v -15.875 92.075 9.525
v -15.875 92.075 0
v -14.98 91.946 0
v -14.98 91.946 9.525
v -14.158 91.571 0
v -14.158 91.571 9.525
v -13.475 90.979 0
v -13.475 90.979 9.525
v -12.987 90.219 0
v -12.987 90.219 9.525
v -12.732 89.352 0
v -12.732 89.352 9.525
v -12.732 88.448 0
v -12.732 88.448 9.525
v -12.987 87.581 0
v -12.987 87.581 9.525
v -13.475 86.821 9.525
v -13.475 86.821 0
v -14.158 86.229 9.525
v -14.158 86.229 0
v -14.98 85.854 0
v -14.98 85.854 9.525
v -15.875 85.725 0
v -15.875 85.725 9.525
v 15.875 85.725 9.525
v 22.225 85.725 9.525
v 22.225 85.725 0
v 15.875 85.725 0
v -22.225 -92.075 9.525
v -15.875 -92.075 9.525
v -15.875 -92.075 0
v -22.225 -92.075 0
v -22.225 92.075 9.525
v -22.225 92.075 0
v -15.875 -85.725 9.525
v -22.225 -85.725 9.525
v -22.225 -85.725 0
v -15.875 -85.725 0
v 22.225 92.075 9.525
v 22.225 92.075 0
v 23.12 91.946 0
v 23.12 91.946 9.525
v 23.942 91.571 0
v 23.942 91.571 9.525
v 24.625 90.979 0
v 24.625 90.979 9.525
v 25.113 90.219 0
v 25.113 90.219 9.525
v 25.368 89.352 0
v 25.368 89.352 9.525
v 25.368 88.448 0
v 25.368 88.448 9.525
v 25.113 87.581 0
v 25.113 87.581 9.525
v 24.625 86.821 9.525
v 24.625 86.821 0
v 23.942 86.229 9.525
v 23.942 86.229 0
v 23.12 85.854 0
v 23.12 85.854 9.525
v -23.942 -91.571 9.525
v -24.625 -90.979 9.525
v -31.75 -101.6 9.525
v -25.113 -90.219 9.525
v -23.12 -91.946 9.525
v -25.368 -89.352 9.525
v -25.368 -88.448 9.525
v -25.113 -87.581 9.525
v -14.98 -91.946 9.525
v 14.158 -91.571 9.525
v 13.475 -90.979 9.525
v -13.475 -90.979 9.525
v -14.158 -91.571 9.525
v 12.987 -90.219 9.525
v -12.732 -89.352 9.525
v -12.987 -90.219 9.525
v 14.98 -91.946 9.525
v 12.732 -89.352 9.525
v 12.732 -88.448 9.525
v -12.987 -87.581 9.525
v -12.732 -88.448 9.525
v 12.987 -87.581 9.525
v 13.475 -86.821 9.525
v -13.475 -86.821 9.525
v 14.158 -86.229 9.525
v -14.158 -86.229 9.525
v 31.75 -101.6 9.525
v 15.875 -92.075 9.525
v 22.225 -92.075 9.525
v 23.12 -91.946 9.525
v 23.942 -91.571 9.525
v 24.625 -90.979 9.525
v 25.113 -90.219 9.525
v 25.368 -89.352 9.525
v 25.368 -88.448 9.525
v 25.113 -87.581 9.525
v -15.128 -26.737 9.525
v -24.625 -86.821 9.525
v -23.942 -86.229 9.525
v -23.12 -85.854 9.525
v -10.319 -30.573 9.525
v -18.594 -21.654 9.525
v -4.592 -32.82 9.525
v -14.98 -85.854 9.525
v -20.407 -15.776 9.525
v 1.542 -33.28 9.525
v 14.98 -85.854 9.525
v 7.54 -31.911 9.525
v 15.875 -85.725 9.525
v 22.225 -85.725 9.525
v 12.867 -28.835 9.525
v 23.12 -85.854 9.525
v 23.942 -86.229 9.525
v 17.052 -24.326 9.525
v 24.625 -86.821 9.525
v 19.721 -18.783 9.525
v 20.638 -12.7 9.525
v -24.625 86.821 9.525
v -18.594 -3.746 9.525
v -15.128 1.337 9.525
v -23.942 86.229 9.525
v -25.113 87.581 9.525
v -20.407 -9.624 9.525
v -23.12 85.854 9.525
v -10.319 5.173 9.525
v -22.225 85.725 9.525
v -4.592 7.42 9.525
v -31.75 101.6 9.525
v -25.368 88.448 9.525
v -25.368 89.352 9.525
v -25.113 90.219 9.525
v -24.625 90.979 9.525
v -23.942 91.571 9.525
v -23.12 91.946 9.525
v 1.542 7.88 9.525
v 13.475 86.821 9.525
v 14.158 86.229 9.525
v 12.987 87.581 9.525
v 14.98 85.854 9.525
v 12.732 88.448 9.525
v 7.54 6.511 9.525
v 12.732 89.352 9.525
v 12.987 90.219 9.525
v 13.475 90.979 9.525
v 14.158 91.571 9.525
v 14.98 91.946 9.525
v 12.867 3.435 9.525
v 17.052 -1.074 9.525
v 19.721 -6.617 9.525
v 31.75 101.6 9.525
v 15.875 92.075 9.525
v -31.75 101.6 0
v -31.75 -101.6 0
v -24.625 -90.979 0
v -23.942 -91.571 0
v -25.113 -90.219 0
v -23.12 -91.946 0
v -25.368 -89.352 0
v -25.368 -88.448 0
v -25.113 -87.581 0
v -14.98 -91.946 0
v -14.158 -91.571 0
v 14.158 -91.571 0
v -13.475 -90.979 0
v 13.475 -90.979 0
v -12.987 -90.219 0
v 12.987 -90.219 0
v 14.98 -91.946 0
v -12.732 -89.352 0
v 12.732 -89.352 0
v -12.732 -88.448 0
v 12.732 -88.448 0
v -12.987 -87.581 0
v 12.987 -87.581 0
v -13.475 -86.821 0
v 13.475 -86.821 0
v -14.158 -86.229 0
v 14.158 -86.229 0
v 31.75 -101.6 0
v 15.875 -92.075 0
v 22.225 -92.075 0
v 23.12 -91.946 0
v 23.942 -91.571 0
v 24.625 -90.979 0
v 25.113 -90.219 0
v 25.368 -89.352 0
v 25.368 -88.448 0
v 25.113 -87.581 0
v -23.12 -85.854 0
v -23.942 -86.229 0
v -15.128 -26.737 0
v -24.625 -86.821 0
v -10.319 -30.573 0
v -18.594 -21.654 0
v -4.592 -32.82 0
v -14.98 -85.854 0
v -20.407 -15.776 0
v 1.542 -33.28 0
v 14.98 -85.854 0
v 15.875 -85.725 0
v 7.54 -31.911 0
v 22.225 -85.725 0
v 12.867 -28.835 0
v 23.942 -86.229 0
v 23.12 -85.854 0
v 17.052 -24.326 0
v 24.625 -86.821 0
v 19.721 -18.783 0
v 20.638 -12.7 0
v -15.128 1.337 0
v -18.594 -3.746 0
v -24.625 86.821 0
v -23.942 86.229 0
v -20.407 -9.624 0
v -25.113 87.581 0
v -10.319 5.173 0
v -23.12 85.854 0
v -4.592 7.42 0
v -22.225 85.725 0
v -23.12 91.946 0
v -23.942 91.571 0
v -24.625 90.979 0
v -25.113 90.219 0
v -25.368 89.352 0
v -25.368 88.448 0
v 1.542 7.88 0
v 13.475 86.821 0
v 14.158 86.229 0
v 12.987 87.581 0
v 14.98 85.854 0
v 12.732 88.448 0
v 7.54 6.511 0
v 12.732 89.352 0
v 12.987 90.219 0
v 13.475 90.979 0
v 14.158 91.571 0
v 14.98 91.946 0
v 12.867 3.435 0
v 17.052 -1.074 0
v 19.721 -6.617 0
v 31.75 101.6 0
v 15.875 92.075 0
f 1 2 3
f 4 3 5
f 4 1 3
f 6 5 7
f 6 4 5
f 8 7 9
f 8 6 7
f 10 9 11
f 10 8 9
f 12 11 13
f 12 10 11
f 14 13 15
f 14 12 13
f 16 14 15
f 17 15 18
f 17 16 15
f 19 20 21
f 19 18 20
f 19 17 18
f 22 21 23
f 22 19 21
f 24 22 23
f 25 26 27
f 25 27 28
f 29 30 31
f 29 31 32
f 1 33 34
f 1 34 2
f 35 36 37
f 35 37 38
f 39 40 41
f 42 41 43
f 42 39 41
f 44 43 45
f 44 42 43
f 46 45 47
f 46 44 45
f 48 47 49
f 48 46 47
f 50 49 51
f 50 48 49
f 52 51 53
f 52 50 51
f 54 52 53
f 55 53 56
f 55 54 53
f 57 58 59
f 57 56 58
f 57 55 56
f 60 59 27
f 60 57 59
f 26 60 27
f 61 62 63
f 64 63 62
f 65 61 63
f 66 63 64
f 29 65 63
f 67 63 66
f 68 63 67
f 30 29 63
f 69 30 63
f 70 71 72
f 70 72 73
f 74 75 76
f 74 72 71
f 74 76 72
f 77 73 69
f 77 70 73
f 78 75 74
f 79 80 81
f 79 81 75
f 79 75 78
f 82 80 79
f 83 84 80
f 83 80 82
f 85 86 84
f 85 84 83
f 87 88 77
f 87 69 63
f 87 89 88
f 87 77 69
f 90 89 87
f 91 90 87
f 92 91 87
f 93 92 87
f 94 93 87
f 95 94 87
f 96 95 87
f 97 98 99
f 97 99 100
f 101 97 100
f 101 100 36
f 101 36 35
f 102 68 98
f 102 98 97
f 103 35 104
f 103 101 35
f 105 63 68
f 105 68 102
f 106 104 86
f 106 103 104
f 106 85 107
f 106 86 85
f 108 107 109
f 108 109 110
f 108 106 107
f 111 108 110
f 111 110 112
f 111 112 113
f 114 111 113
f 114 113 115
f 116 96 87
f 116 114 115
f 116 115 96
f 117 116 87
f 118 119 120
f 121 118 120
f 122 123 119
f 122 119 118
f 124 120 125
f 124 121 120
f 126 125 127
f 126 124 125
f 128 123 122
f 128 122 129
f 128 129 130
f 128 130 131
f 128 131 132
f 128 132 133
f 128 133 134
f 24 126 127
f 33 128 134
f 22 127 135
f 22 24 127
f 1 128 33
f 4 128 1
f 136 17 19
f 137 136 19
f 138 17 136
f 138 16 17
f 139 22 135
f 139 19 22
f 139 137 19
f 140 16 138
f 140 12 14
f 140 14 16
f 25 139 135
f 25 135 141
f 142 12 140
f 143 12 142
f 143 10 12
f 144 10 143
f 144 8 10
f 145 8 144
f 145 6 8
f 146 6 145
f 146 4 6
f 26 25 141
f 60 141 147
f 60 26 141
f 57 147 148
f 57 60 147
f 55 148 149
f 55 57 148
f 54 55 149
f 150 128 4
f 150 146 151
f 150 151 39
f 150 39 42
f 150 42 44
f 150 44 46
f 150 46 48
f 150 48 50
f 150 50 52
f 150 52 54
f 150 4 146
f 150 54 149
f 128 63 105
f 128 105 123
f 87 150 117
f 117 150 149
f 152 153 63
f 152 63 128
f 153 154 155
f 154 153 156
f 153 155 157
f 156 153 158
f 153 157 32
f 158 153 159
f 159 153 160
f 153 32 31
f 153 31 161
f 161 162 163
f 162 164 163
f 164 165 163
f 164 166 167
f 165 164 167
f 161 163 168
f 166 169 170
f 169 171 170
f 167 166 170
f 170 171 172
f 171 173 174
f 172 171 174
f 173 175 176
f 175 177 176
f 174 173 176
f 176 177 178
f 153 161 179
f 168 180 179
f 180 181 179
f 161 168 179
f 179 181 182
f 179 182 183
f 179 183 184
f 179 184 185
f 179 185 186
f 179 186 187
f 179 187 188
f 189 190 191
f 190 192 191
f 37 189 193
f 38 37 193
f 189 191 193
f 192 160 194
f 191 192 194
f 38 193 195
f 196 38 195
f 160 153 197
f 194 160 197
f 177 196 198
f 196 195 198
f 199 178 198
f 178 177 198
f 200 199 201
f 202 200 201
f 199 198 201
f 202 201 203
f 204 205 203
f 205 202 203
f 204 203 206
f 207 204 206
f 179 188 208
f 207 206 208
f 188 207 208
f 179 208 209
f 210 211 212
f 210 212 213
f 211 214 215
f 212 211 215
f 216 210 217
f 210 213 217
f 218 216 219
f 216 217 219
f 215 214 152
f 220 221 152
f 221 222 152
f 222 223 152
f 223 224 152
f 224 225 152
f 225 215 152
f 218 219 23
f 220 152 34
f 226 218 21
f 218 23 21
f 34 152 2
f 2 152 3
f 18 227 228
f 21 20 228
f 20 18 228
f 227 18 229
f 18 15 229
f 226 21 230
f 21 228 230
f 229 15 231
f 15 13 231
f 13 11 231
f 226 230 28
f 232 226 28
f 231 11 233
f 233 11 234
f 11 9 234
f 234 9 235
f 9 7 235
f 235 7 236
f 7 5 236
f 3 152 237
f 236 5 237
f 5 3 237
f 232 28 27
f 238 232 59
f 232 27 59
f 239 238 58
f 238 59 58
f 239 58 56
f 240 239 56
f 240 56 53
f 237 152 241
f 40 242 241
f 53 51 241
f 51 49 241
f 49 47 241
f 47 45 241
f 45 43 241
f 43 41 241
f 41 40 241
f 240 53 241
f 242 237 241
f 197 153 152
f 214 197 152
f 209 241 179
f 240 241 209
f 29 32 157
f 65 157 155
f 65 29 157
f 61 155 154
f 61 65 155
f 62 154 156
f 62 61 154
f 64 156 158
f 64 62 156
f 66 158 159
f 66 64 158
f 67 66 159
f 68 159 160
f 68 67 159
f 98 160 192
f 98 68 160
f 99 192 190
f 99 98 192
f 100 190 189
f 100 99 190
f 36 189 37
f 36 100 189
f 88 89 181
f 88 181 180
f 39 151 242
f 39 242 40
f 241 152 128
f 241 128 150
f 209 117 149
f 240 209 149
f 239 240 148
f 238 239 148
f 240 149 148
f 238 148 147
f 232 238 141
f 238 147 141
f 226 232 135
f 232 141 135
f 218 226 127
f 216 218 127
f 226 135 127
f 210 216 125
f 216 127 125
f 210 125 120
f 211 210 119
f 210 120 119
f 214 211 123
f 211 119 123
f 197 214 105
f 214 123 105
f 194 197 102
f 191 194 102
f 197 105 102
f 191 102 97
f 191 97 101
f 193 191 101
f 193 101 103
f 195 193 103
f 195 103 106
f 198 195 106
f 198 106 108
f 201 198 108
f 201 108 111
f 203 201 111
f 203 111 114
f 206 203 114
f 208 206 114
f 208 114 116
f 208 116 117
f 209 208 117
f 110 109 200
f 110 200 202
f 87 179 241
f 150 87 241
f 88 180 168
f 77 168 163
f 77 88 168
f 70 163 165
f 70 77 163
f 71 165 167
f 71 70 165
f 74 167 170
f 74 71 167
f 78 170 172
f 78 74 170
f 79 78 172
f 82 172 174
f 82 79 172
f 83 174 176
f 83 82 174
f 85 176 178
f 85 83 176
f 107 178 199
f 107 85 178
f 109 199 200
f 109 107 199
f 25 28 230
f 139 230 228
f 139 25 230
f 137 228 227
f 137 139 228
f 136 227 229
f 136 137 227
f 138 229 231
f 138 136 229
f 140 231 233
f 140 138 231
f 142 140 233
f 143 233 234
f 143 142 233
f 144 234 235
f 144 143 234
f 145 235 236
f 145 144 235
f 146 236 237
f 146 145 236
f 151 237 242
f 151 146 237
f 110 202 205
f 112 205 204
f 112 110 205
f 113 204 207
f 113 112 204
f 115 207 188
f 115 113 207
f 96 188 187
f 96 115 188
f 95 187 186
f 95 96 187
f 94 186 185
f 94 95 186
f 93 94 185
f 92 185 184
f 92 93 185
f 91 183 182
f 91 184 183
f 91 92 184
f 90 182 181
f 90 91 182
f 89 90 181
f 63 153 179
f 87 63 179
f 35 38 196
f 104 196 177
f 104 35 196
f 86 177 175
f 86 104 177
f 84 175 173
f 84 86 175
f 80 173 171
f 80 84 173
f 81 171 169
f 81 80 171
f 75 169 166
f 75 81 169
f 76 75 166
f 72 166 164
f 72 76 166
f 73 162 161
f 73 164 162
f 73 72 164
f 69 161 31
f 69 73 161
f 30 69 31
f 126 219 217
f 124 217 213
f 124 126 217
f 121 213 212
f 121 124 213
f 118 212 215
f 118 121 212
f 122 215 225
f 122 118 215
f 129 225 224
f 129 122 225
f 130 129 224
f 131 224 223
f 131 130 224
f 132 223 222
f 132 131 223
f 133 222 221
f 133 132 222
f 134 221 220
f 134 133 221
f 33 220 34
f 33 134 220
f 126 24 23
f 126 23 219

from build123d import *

# Parameters (mm, degrees)
SKETCH1_W            = 63.5
SKETCH1_H            = 203.2
BOSS_EXTRUDE1_DEPTH  = 9.525
CUT_EXTRUDE1_DEPTH   = 107.870707516
LPATTERN1_COUNT      = 2
LPATTERN1_PITCH      = 38.1
LPATTERN1_COUNT_DIR2 = 2
LPATTERN1_PITCH_DIR2 = 177.8
SKETCH3_R            = 20.6375
CUT_EXTRUDE2_DEPTH   = 107.870707516


with BuildPart() as part:
    # Sketch1 → Boss-Extrude1 (new body)
    with BuildSketch(Plane.XY):
        Rectangle(SKETCH1_W, SKETCH1_H)
    extrude(amount=BOSS_EXTRUDE1_DEPTH)

    # Sketch2 → Cut-Extrude1 (cut, through all)
    with BuildSketch(Plane.XY.offset(9.525)):
        with BuildLine():
            Line((-22.225, 92.075), (-15.875, 92.075))
            ThreePointArc((-15.875, 92.075), (-12.7, 88.9), (-15.875, 85.725))
            Line((-15.875, 85.725), (-22.225, 85.725))
            ThreePointArc((-22.225, 85.725), (-25.4, 88.9), (-22.225, 92.075))
        make_face()
    cut_extrude1 = extrude(amount=-CUT_EXTRUDE1_DEPTH, mode=Mode.SUBTRACT)

    # LPattern1: Cut-Extrude1 2 × 2
    with Locations(*[(i * LPATTERN1_PITCH, -j * LPATTERN1_PITCH_DIR2, 0) for i in range(LPATTERN1_COUNT) for j in range(LPATTERN1_COUNT_DIR2) if (i, j) != (0, 0)]):
        add(cut_extrude1, mode=Mode.SUBTRACT)

    # Sketch3 → Cut-Extrude2 (cut, through all)
    with BuildSketch(Plane.XY.offset(9.525)):
        with Locations((0, -12.7)):
            Circle(SKETCH3_R)
    extrude(amount=-CUT_EXTRUDE2_DEPTH, mode=Mode.SUBTRACT)


solid = part.part
